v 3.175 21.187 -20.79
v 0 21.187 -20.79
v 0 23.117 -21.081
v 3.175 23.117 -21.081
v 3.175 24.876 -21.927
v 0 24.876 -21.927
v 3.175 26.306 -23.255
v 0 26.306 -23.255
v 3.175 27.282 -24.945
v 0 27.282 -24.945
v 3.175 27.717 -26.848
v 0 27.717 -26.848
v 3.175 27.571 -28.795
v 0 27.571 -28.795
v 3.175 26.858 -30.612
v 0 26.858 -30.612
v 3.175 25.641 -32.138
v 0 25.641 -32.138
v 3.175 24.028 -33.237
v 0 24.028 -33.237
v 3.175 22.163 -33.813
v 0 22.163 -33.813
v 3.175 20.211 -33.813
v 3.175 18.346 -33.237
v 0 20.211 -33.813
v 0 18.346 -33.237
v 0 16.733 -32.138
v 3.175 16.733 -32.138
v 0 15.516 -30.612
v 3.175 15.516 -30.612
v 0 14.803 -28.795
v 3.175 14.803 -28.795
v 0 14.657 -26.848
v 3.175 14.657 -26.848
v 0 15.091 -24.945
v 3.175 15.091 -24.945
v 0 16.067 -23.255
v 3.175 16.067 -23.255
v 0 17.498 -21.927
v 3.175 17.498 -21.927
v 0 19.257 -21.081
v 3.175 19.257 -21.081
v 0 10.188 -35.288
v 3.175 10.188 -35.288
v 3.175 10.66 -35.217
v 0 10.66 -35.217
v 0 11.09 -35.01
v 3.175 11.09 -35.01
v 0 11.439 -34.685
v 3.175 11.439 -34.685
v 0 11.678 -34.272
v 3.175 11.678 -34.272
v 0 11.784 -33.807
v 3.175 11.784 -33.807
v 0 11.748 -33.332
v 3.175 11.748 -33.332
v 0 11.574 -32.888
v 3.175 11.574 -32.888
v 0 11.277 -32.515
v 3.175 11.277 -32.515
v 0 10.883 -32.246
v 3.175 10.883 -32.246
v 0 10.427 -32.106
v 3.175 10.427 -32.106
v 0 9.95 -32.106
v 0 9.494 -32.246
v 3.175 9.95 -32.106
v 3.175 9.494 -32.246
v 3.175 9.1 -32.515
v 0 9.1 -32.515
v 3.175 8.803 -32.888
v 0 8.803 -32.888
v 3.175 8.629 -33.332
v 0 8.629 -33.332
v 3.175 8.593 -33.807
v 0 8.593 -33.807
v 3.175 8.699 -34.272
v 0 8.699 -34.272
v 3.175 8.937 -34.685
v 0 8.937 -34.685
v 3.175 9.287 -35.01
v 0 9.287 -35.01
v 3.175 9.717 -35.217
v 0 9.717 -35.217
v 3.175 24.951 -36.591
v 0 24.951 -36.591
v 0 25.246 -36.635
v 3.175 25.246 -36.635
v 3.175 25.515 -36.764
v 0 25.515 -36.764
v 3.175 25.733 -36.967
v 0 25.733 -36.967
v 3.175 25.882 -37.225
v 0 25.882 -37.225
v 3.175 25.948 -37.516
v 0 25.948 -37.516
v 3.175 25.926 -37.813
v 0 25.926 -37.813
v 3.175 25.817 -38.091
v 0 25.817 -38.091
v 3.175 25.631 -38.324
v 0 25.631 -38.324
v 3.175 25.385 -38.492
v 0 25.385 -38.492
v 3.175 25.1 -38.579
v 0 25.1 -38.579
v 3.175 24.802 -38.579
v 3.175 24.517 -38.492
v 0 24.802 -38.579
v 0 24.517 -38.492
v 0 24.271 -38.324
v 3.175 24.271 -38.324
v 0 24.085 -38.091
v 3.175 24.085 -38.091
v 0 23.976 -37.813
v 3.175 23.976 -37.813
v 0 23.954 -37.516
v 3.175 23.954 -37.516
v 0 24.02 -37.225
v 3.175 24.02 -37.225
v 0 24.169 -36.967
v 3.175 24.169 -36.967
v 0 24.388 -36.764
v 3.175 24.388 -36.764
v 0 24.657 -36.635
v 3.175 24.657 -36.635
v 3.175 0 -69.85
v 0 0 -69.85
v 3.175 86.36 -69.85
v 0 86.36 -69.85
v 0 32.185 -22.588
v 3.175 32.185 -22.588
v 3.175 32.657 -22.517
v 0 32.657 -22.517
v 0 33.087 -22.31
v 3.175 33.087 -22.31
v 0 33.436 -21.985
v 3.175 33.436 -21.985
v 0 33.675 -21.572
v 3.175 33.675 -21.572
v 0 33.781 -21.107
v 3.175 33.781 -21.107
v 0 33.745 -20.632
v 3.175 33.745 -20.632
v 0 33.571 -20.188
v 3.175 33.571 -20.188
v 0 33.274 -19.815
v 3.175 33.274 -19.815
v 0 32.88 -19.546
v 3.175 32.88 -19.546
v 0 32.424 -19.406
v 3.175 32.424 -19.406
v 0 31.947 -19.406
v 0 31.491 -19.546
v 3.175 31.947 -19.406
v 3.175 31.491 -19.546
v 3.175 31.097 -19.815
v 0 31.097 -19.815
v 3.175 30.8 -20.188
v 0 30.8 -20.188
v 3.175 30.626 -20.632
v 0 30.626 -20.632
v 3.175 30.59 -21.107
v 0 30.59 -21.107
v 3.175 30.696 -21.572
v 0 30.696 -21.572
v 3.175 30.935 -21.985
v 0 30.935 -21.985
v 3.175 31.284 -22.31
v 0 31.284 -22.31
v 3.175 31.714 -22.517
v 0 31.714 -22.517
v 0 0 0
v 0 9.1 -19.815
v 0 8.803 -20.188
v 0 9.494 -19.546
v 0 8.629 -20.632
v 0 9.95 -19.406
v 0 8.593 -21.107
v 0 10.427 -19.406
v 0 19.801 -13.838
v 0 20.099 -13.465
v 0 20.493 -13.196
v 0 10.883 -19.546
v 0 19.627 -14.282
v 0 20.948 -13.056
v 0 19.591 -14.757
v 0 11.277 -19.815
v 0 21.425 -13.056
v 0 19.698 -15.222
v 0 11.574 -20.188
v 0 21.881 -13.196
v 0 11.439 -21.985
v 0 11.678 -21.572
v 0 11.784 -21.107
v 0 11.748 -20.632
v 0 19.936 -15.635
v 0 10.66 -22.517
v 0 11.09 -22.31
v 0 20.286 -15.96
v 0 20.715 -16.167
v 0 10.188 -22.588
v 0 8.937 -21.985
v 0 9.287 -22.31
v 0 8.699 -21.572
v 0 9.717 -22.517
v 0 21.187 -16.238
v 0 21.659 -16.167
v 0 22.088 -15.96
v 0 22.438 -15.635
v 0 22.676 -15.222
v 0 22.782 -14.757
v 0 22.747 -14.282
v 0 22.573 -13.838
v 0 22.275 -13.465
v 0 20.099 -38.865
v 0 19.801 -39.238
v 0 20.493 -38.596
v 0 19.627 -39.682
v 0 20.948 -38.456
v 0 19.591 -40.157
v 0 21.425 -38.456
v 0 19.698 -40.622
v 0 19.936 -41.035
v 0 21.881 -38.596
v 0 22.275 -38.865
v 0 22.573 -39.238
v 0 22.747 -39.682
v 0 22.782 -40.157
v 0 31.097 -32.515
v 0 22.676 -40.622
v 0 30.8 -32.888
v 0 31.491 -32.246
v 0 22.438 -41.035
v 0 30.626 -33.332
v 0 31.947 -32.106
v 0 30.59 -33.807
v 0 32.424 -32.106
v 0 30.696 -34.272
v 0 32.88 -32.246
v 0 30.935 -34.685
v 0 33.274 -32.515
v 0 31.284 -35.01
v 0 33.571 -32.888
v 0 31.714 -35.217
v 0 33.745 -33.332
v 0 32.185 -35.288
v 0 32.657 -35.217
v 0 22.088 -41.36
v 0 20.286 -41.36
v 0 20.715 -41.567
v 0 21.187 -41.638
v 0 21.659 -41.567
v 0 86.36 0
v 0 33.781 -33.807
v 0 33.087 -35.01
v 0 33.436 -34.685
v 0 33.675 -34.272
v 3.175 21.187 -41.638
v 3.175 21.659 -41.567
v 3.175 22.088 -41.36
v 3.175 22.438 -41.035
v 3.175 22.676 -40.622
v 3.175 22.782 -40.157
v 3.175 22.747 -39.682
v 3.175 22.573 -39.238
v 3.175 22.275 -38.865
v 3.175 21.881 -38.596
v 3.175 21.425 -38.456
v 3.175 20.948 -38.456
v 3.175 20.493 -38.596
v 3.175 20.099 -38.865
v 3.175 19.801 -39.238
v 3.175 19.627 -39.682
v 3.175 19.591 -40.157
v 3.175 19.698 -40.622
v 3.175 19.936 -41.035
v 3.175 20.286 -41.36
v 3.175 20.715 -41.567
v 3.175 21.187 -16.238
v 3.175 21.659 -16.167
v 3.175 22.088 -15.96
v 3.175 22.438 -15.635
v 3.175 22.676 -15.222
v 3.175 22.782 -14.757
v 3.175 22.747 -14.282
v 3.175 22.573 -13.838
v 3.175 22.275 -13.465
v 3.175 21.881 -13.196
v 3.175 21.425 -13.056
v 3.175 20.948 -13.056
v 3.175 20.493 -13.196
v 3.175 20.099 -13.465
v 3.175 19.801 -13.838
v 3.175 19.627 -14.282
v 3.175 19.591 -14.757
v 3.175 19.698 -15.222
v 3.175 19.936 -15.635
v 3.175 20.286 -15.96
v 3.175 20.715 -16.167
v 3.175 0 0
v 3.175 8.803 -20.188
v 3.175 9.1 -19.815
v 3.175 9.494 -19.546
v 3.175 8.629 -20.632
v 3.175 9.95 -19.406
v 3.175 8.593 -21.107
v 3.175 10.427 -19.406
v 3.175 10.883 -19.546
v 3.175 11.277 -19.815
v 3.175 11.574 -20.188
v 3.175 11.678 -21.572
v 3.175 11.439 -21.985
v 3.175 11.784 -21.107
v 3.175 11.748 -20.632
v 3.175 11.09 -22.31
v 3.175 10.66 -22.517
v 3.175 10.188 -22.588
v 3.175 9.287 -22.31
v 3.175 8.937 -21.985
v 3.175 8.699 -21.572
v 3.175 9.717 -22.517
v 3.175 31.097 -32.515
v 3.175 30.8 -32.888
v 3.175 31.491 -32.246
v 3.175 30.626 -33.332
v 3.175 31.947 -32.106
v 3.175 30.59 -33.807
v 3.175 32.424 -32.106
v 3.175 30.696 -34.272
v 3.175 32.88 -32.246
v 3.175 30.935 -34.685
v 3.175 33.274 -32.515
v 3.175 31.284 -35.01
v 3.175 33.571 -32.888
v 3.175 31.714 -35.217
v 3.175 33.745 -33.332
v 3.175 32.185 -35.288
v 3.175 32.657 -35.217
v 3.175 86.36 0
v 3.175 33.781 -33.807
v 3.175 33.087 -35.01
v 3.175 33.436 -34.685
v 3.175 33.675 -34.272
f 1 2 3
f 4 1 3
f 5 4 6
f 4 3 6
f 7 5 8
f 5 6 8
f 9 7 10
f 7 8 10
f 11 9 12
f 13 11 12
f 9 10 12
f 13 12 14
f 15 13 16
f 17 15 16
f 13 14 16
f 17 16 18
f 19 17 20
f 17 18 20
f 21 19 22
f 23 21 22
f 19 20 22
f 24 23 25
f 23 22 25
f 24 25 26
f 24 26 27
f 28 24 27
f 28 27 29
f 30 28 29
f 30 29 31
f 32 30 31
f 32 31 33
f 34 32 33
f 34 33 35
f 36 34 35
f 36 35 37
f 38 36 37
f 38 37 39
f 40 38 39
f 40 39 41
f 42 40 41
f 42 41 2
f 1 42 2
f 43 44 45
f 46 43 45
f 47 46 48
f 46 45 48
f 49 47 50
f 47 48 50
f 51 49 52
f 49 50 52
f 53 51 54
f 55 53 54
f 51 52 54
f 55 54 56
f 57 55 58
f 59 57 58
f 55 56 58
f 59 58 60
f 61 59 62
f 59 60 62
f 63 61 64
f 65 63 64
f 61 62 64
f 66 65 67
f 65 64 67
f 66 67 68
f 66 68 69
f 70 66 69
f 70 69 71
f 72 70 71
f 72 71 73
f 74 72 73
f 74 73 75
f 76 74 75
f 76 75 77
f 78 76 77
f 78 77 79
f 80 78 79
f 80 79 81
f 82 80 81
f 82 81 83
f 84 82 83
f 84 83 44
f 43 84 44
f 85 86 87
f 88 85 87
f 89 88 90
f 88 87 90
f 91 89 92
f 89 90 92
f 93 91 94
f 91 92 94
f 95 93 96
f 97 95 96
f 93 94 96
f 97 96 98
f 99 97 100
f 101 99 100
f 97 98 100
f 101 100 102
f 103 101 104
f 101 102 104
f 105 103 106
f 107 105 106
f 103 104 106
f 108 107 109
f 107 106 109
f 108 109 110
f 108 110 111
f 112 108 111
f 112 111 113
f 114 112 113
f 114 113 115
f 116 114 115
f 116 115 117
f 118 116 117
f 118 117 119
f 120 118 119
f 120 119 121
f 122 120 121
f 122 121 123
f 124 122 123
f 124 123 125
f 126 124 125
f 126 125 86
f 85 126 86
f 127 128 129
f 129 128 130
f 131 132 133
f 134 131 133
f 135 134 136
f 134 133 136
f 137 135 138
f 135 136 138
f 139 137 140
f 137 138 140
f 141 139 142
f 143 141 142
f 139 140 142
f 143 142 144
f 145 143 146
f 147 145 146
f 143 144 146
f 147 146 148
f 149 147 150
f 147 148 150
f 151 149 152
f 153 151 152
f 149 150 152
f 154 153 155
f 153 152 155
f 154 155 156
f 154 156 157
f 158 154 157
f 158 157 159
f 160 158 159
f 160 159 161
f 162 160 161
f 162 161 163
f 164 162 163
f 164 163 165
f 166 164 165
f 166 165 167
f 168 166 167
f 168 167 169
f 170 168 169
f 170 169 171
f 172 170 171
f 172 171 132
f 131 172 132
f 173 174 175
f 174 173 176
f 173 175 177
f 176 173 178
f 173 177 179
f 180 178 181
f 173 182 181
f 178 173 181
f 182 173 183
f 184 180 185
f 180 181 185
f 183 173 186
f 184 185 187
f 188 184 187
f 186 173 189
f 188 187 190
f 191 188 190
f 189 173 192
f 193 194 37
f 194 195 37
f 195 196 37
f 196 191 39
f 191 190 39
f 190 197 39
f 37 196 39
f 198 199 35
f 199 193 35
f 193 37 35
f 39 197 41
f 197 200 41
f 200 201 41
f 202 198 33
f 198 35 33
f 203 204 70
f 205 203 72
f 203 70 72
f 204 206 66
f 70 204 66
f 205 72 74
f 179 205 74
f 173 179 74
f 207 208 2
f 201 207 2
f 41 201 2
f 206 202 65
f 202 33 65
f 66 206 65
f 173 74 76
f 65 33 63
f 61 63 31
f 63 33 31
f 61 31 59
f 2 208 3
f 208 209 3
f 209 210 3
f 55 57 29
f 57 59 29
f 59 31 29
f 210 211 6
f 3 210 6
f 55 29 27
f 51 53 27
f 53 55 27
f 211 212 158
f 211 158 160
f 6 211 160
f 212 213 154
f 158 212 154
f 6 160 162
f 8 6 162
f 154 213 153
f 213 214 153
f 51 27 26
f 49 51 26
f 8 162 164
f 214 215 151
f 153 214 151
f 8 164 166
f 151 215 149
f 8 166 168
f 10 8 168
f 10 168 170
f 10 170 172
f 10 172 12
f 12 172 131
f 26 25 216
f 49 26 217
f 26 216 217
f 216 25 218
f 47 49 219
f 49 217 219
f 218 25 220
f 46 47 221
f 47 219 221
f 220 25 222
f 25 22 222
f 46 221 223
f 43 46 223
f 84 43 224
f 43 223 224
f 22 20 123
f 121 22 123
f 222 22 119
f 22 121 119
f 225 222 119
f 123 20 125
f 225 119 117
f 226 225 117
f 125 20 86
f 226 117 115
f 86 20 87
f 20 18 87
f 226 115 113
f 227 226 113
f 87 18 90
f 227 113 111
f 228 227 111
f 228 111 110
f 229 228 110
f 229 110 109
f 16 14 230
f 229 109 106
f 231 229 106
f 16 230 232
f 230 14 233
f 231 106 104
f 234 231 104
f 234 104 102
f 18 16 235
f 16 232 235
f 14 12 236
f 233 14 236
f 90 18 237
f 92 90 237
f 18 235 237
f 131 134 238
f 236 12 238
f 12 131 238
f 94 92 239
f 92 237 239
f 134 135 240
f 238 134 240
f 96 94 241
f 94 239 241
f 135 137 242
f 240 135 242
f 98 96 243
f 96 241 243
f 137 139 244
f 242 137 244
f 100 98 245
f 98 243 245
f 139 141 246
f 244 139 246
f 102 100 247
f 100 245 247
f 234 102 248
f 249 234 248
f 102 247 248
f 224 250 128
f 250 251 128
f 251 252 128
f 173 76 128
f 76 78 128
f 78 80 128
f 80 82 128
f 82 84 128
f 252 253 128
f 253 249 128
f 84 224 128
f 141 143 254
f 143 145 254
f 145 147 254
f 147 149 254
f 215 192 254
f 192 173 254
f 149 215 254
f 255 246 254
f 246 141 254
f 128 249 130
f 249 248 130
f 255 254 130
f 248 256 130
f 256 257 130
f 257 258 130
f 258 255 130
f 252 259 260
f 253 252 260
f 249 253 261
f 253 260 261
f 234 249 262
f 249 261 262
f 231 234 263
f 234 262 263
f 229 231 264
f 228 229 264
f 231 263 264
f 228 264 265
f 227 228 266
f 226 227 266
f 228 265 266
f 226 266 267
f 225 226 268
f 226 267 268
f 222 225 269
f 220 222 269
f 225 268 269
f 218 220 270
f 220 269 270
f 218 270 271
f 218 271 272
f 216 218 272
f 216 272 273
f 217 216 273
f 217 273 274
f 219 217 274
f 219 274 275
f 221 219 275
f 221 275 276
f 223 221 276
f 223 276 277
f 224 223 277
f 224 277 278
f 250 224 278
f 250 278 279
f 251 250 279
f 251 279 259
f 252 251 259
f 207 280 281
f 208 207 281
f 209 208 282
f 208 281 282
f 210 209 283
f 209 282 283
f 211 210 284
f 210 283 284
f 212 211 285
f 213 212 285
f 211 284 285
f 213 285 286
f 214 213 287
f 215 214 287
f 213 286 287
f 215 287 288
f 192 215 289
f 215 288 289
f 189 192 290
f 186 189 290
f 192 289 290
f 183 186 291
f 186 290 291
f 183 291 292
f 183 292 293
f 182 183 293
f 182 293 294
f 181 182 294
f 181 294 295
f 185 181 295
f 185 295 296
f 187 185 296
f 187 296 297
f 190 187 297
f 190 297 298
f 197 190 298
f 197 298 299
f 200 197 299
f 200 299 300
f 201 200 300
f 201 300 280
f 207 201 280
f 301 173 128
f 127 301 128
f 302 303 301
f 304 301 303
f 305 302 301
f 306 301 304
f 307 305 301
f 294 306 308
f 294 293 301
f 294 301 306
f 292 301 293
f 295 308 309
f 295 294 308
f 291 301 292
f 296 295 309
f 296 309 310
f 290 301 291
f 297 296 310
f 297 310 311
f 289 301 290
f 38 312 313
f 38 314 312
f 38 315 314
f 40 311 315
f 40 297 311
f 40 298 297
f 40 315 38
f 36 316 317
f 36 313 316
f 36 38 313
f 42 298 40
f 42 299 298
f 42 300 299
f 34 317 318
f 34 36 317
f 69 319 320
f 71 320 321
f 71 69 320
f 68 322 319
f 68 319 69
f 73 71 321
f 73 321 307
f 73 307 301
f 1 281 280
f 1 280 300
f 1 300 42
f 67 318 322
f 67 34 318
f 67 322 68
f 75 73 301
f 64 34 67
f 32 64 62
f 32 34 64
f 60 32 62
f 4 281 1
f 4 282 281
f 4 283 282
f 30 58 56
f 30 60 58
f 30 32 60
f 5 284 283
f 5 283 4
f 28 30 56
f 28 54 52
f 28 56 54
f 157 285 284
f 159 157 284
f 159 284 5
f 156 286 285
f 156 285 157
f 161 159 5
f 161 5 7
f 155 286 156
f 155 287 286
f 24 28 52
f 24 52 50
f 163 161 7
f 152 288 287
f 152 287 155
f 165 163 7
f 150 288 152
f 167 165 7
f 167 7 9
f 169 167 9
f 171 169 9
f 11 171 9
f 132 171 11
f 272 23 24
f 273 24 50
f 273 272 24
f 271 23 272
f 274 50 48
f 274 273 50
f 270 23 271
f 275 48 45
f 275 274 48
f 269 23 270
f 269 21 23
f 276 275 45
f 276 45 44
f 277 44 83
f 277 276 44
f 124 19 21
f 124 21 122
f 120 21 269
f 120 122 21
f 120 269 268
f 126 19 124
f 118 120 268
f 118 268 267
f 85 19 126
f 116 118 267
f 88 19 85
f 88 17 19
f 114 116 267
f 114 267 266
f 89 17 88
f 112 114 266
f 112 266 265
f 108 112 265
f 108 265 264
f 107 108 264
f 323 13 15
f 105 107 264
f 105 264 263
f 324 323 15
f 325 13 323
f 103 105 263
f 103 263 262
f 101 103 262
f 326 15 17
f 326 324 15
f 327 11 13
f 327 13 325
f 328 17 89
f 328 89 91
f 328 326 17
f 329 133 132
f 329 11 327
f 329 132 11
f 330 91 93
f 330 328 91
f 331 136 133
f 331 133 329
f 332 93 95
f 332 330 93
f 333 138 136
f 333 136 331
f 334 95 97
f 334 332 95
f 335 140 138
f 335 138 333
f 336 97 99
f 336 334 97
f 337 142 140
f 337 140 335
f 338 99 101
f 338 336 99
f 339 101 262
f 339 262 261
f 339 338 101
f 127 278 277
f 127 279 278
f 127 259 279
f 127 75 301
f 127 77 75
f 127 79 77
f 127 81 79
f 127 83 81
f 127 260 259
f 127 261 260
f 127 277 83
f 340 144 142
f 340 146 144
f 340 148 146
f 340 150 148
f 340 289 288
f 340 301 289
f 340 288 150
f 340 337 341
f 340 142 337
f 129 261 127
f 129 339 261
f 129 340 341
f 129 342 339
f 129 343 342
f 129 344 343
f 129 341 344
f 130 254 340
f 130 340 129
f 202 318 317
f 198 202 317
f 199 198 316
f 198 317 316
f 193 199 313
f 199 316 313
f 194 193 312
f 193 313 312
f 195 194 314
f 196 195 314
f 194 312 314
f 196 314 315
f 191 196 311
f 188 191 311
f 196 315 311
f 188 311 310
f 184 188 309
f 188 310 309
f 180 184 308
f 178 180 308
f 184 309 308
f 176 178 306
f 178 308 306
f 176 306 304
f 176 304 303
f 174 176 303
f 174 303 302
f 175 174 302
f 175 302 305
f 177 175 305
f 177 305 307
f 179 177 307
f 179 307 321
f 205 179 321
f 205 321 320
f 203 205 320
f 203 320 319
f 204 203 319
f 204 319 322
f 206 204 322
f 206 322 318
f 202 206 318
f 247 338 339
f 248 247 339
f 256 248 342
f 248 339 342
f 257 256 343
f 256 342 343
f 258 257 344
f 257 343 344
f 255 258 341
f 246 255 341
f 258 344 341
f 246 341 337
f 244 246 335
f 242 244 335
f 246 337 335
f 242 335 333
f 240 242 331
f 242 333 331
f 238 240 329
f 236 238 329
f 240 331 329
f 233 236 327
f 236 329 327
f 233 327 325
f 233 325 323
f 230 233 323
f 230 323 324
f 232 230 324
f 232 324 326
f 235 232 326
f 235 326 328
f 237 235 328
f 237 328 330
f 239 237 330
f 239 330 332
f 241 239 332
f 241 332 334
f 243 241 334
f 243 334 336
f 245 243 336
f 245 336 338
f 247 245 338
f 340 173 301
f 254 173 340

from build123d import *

# Parameters (mm, degrees)
SKETCH1_W                           = 69.85
SKETCH1_H                           = 86.36
BOSS_EXTRUDE1_DEPTH                 = 3.175
F_1_2_CLEARANCE_HOLE1_D             = 13.09624
F_1_2_CLEARANCE_HOLE1_DEPTH         = 25.4
F_1_2_CLEARANCE_HOLE1_TIP           = 3.934507437
M3_CLEARANCE_HOLE1_D                = 3.2
M3_CLEARANCE_HOLE1_DEPTH            = 25.4
M3_CLEARANCE_HOLE1_TIP              = 0.96137699
F_2_0MM_CLEARANCE_DOWEL_HOLE1_D     = 2
F_2_0MM_CLEARANCE_DOWEL_HOLE1_DEPTH = 25.4
F_2_0MM_CLEARANCE_DOWEL_HOLE1_TIP   = 0.600860619


with BuildPart() as part:
    # Sketch1 → Boss-Extrude1 (new body)
    with BuildSketch(Plane(origin=(0, 0, 0), x_dir=(0, 0, -1), z_dir=(1, 0, 0))):
        with Locations((34.925, 43.18)):
            Rectangle(SKETCH1_W, SKETCH1_H)
    extrude(amount=BOSS_EXTRUDE1_DEPTH)

    # 1/2 Clearance Hole1
    with Locations(Plane(origin=(3.175, 0, 0), x_dir=(0, 0, -1), z_dir=(1, 0, 0))):
        with Locations((27.33778886, 21.18693756)):
            Hole(F_1_2_CLEARANCE_HOLE1_D / 2, depth=F_1_2_CLEARANCE_HOLE1_DEPTH)
            with Locations((0, 0, -(F_1_2_CLEARANCE_HOLE1_DEPTH + F_1_2_CLEARANCE_HOLE1_TIP / 2))):  # 118° drill point
                Cone(0, F_1_2_CLEARANCE_HOLE1_D / 2, F_1_2_CLEARANCE_HOLE1_TIP, mode=Mode.SUBTRACT)

    # M3 Clearance Hole1
    with Locations(Plane.ZY):
        with Locations((-40.03778886, 21.18693756), (-33.68778886, 32.185460188), (-20.98778886, 32.185460188), (-14.63778886, 21.18693756), (-20.98778886, 10.188414932), (-33.68778886, 10.188414932), (-27.33778886, 21.18693756)):
            Hole(M3_CLEARANCE_HOLE1_D / 2, depth=M3_CLEARANCE_HOLE1_DEPTH)
            with Locations((0, 0, -(M3_CLEARANCE_HOLE1_DEPTH + M3_CLEARANCE_HOLE1_TIP / 2))):  # 118° drill point
                Cone(0, M3_CLEARANCE_HOLE1_D / 2, M3_CLEARANCE_HOLE1_TIP, mode=Mode.SUBTRACT)

    # Ø2.0mm Clearance Dowel Hole1
    with Locations(Plane(origin=(3.175, 0, 0), x_dir=(0, 0, -1), z_dir=(1, 0, 0))):
        with Locations((37.59058776, 24.95127344)):
            Hole(F_2_0MM_CLEARANCE_DOWEL_HOLE1_D / 2, depth=F_2_0MM_CLEARANCE_DOWEL_HOLE1_DEPTH)
            with Locations((0, 0, -(F_2_0MM_CLEARANCE_DOWEL_HOLE1_DEPTH + F_2_0MM_CLEARANCE_DOWEL_HOLE1_TIP / 2))):  # 118° drill point
                Cone(0, F_2_0MM_CLEARANCE_DOWEL_HOLE1_D / 2, F_2_0MM_CLEARANCE_DOWEL_HOLE1_TIP, mode=Mode.SUBTRACT)


solid = part.part
